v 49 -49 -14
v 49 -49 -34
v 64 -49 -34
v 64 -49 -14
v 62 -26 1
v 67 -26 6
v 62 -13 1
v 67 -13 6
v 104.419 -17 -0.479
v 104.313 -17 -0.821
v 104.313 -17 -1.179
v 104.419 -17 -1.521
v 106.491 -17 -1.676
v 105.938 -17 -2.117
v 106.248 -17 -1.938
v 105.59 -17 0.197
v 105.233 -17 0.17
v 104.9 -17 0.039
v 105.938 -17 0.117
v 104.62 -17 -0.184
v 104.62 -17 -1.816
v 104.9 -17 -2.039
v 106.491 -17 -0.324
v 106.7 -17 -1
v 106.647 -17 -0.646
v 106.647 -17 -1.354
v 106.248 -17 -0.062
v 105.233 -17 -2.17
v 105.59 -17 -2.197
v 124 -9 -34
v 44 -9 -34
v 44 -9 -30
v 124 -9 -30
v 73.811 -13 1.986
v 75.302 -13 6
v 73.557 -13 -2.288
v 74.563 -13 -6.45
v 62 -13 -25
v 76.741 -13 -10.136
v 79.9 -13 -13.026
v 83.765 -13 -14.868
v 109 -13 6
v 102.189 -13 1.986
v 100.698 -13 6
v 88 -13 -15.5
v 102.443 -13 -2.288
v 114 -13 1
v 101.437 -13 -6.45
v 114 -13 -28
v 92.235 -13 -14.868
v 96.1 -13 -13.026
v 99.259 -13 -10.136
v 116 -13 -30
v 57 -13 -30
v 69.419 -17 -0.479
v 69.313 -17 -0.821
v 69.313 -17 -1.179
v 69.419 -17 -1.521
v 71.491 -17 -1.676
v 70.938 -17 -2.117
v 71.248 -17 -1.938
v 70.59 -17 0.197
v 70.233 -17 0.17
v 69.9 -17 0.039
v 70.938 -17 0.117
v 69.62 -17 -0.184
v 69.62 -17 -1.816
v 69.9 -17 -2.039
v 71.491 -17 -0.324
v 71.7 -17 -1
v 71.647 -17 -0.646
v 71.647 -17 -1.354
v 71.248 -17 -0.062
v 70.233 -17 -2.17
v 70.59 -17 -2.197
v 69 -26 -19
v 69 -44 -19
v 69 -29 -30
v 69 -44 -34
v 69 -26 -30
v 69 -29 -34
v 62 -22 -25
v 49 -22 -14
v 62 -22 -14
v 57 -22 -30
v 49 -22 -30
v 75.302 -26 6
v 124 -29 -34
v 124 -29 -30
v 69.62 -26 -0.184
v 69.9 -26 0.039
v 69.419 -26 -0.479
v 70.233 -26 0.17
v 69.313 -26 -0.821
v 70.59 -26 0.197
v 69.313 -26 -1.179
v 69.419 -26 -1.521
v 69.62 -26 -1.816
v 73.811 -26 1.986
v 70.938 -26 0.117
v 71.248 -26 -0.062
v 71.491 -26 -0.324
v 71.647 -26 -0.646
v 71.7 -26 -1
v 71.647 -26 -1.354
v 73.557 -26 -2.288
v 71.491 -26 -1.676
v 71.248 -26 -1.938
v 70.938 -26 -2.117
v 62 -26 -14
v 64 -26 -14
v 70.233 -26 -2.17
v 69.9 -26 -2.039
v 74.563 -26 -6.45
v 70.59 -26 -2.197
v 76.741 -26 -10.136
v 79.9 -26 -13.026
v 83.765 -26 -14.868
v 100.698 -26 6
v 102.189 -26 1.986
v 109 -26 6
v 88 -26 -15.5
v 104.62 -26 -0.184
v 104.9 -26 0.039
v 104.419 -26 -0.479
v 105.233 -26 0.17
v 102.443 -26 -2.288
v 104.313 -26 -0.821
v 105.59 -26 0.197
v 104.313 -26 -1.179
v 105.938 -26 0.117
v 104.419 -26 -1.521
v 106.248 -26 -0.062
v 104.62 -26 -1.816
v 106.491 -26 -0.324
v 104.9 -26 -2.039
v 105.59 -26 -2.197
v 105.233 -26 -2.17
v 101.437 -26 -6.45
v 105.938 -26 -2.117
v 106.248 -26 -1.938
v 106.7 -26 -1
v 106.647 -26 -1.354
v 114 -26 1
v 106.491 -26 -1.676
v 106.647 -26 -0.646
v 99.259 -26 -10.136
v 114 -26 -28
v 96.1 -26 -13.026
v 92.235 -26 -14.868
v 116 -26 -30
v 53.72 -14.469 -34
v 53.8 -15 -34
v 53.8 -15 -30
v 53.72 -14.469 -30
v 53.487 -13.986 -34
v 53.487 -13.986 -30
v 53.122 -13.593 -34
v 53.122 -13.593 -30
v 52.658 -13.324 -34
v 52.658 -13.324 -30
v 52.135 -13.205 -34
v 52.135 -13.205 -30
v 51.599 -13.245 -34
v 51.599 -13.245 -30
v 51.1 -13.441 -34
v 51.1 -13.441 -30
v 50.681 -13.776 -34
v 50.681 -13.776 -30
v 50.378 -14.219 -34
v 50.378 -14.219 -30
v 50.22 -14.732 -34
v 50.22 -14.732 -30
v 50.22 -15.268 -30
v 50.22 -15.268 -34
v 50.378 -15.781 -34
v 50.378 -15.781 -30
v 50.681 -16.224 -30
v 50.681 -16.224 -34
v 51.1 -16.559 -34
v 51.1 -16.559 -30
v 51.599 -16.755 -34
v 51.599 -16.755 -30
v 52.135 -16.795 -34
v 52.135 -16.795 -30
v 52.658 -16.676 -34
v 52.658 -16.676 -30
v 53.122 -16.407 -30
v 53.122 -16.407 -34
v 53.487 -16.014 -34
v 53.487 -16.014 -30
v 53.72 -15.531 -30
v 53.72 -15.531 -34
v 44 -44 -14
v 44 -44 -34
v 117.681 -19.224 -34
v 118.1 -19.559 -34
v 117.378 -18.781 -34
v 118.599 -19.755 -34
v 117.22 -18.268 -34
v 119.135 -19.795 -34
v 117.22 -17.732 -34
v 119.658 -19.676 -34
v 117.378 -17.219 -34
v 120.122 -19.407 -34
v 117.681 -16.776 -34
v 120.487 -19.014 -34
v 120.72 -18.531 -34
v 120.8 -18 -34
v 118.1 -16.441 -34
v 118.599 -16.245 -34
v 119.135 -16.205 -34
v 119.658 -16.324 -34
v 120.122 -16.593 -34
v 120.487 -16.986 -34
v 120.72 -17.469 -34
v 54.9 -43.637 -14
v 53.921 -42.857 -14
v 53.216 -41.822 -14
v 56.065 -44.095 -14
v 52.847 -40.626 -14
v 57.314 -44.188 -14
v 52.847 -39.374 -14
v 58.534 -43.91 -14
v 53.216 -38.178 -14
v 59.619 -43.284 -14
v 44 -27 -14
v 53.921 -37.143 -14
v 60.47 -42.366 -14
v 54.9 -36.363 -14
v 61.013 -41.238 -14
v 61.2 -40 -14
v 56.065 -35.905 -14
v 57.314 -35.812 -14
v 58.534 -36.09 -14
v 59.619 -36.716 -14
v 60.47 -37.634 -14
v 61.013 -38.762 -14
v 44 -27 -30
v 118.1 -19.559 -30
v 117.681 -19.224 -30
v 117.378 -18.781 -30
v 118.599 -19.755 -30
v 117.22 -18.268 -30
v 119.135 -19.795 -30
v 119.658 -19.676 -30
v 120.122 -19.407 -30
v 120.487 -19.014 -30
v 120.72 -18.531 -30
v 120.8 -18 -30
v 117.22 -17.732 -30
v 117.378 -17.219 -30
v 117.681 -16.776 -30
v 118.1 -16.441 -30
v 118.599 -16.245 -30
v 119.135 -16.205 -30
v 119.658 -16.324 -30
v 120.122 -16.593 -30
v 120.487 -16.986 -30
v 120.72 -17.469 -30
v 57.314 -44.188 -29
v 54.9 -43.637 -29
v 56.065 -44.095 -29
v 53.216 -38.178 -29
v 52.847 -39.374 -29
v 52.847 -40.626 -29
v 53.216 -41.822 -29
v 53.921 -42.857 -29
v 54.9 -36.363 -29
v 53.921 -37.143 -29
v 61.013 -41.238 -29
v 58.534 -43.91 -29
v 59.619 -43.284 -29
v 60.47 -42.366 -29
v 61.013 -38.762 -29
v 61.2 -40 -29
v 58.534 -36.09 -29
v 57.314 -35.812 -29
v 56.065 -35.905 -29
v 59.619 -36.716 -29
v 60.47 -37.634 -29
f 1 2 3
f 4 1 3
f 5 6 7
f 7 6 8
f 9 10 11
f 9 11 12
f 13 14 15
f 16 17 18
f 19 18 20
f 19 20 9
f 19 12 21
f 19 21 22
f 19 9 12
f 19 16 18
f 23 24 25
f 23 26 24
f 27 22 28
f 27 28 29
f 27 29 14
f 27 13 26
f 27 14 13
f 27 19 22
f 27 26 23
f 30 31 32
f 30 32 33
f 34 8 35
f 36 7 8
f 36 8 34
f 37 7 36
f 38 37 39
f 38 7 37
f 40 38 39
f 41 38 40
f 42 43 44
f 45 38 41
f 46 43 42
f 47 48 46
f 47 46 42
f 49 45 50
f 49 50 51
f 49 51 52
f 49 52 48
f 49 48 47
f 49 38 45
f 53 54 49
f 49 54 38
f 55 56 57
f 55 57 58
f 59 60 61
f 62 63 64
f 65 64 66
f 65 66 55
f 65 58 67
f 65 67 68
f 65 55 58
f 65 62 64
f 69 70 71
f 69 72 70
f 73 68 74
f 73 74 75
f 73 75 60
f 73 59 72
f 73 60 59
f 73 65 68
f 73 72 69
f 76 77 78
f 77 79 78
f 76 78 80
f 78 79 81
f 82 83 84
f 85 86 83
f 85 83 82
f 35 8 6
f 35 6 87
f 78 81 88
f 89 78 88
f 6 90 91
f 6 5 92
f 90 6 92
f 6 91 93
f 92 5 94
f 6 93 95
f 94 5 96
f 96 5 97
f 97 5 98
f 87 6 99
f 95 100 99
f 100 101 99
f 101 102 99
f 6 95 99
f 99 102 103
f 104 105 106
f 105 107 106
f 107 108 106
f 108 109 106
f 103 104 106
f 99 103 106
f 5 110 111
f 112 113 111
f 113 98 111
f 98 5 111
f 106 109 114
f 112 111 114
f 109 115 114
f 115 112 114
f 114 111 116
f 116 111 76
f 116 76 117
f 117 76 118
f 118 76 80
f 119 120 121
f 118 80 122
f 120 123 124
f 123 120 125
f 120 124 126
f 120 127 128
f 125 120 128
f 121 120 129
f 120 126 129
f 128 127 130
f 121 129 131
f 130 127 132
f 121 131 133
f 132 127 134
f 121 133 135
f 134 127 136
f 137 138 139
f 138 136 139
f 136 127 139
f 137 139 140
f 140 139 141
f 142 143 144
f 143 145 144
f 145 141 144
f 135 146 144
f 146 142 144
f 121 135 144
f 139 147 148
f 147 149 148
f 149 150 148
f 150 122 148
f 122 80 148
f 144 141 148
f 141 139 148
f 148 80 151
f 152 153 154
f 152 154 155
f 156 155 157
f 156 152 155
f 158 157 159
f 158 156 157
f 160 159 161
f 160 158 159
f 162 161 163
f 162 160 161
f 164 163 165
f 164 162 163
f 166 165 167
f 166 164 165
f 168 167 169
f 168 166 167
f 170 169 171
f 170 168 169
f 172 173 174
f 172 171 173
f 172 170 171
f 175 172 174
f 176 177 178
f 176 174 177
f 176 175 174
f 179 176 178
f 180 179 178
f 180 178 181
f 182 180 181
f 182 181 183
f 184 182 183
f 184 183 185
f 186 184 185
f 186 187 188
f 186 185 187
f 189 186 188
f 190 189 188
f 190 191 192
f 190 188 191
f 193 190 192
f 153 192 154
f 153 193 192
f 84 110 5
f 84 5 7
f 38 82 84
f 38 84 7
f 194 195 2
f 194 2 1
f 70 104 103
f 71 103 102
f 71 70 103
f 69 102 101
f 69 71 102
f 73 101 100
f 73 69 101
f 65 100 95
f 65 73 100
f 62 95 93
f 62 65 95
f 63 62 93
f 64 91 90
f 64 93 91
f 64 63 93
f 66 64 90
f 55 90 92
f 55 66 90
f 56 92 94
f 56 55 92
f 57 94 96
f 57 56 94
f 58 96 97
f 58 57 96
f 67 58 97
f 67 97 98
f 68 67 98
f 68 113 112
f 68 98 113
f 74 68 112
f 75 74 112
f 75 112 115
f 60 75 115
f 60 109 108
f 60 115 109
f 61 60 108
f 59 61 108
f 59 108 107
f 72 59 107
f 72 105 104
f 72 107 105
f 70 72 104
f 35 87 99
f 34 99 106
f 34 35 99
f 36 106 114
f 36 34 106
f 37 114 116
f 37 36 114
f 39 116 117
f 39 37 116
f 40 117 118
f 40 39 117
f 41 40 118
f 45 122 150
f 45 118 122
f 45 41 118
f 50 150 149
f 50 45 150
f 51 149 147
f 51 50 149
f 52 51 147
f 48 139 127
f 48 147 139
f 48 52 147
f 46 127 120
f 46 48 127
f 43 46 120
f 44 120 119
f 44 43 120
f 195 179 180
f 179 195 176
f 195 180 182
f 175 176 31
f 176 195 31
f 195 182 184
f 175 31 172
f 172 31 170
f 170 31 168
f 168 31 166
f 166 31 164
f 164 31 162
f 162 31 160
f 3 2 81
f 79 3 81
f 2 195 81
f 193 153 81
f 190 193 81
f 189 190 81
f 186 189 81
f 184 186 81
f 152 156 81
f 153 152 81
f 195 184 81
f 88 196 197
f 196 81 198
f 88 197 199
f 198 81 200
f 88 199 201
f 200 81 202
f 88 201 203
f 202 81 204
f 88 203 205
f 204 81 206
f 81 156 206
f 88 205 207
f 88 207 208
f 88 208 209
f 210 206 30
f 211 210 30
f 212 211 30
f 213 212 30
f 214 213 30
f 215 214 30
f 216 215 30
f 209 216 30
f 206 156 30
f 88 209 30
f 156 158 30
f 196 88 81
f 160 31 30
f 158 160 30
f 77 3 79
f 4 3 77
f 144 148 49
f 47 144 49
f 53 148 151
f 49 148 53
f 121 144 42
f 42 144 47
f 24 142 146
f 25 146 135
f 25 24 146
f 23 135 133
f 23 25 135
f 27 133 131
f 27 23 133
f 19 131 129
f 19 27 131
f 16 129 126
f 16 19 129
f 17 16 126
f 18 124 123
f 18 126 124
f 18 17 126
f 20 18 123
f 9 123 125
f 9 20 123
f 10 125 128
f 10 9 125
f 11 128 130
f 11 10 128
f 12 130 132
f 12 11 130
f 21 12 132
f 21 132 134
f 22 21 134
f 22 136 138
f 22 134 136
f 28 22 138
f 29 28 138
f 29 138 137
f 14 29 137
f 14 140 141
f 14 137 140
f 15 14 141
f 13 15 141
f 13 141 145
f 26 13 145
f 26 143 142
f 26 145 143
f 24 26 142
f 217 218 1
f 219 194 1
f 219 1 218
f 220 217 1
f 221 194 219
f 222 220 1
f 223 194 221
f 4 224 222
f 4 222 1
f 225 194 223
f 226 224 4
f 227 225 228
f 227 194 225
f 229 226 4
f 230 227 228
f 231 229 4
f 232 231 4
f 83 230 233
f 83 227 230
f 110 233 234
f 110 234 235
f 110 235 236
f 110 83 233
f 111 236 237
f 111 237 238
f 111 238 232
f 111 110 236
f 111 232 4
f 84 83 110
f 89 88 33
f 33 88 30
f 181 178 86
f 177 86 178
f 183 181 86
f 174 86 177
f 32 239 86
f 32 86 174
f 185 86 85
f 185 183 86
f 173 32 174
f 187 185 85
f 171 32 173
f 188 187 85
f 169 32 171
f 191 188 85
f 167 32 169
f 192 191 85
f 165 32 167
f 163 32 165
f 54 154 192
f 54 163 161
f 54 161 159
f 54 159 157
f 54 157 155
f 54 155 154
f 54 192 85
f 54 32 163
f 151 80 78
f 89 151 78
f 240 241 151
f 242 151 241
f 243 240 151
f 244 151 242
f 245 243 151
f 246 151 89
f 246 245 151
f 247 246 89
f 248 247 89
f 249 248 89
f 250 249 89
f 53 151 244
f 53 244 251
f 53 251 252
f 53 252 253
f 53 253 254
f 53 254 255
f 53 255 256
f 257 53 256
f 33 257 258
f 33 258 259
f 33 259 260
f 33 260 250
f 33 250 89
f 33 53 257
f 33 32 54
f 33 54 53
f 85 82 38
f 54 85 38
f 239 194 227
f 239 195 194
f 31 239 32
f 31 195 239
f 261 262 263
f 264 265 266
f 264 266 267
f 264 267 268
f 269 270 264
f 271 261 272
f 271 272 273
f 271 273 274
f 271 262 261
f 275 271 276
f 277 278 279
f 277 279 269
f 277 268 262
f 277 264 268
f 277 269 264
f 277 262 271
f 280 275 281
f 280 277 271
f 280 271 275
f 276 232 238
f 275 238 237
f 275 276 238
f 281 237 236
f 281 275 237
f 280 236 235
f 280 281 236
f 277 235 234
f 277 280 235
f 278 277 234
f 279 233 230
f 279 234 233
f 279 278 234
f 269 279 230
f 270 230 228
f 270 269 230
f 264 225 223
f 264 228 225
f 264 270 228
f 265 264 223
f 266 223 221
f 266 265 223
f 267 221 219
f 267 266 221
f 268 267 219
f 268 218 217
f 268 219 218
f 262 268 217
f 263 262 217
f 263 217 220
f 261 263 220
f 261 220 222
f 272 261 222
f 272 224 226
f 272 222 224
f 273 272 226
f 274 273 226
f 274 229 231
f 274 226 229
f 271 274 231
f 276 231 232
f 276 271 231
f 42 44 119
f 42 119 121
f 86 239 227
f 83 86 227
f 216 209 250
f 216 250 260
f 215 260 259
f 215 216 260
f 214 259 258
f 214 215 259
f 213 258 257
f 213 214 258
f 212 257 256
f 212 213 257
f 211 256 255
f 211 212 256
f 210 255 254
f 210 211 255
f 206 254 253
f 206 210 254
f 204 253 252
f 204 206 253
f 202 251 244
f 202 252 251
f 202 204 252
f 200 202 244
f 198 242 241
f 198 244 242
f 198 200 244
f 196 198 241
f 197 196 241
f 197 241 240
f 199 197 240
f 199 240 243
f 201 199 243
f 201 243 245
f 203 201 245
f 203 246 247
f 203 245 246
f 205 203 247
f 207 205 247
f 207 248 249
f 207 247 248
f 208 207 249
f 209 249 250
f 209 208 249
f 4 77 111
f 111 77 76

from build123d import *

# Parameters (mm, degrees)
CYLINDER050_R          = 14.5
CYLINDER050_DEPTH      = 22
CYLINDER050_ROLL_ANGLE = 90
CYLINDER047_R          = 1.8
CYLINDER047_DEPTH      = 10
CYLINDER048_R          = 1.2
CYLINDER048_DEPTH      = 10
CYLINDER048_ROLL_ANGLE = 90
CYLINDER049_R          = 1.2
CYLINDER049_DEPTH      = 10
CYLINDER049_ROLL_ANGLE = 90
CYLINDER046_R          = 1.8
CYLINDER046_DEPTH      = 10
BOX006_W               = 52
BOX006_H               = 13
BOX006_DEPTH           = 40
BOX012_W               = 80
BOX012_H               = 20
BOX012_DEPTH           = 4
CYLINDER035_R          = 4.2
CYLINDER035_DEPTH      = 200
BOX007_W               = 25
BOX007_H               = 27
BOX007_DEPTH           = 20
CHAMFER007_SIZE        = 5
CHAMFER008_SIZE        = 5
CHAMFER009_SIZE        = 2
CHAMFER010_SIZE        = 5
CHAMFER011_SIZE        = 5
CHAMFER012_SIZE        = 5
CHAMFER013_SIZE        = 5
CHAMFER014_SIZE        = 5


with BuildPart() as cilindro047:
    # Cylinder050 → Cylinder050 (new body)
    with BuildSketch(Plane.XY):
        Circle(CYLINDER050_R)
    extrude(amount=CYLINDER050_DEPTH)


with BuildPart() as cilindro047_1:
    # Cylinder050 roll: moved
    add(cilindro047.part.rotate(Axis((0, 0, 0), (1, 0, 0)), CYLINDER050_ROLL_ANGLE))


with BuildPart() as cilindro047_2:
    # Cylinder050 placement: moved
    add(cilindro047_1.part.moved(Location((88, -7, -1))))


with BuildPart() as cilindro044:
    # Cylinder047 → Cylinder047 (new body)
    with BuildSketch(Plane(origin=(52, -15, -35), x_dir=(1, 0, 0), z_dir=(0, 0, 1))):
        Circle(CYLINDER047_R)
    extrude(amount=CYLINDER047_DEPTH)


with BuildPart() as cilindro045:
    # Cylinder048 → Cylinder048 (new body)
    with BuildSketch(Plane.XY):
        Circle(CYLINDER048_R)
    extrude(amount=CYLINDER048_DEPTH)


with BuildPart() as cilindro045_1:
    # Cylinder048 roll: moved
    add(cilindro045.part.rotate(Axis((0, 0, 0), (1, 0, 0)), CYLINDER048_ROLL_ANGLE))


with BuildPart() as cilindro045_2:
    # Cylinder048 placement: moved
    add(cilindro045_1.part.moved(Location((70.5, -17, -1))))


with BuildPart() as cilindro046:
    # Cylinder049 → Cylinder049 (new body)
    with BuildSketch(Plane.XY):
        Circle(CYLINDER049_R)
    extrude(amount=CYLINDER049_DEPTH)


with BuildPart() as cilindro046_1:
    # Cylinder049 roll: moved
    add(cilindro046.part.rotate(Axis((0, 0, 0), (1, 0, 0)), CYLINDER049_ROLL_ANGLE))


with BuildPart() as cilindro046_2:
    # Cylinder049 placement: moved
    add(cilindro046_1.part.moved(Location((105.5, -17, -1))))


with BuildPart() as fusion010:
    # Cylinder046 → Cylinder046 (new body)
    with BuildSketch(Plane(origin=(119, -18, -35), x_dir=(1, 0, 0), z_dir=(0, 0, 1))):
        Circle(CYLINDER046_R)
    extrude(amount=CYLINDER046_DEPTH)

    # Fusion010: union Cilindro044, Cilindro045, Cilindro046
    add(cilindro044.part)
    add(cilindro045_2.part)
    add(cilindro046_2.part)


with BuildPart() as cubo006:
    # Box006 → Box006 (new body)
    with BuildSketch(Plane(origin=(62, -26, -34), x_dir=(1, 0, 0), z_dir=(0, 0, 1))):
        with Locations((26, 6.5)):
            Rectangle(BOX006_W, BOX006_H)
    extrude(amount=BOX006_DEPTH)


with BuildPart() as cubo012:
    # Box012 → Box012 (new body)
    with BuildSketch(Plane(origin=(44, -29, -34), x_dir=(1, 0, 0), z_dir=(0, 0, 1))):
        with Locations((40, 10)):
            Rectangle(BOX012_W, BOX012_H)
    extrude(amount=BOX012_DEPTH)


with BuildPart() as cilindro032:
    # Cylinder035 → Cylinder035 (new body)
    with BuildSketch(Plane(origin=(57, -40, -29), x_dir=(1, 0, 0), z_dir=(0, 0, 1))):
        Circle(CYLINDER035_R)
    extrude(amount=CYLINDER035_DEPTH)


with BuildPart() as base_motor:
    # Box007 → Box007 (new body)
    with BuildSketch(Plane(origin=(44, -49, -34), x_dir=(1, 0, 0), z_dir=(0, 0, 1))):
        with Locations((12.5, 13.5)):
            Rectangle(BOX007_W, BOX007_H)
    extrude(amount=BOX007_DEPTH)

    # Cut028: cut Cilindro032
    add(cilindro032.part, mode=Mode.SUBTRACT)

    # Fusion011: union Cubo006, Cubo012
    add(cubo006.part)
    add(cubo012.part)

    # Cut035: cut Fusion010
    add(fusion010.part, mode=Mode.SUBTRACT)

    # Cut036: cut Cilindro047
    add(cilindro047_2.part, mode=Mode.SUBTRACT)

    # Chamfer007
    chamfer007_edges = [base_motor.edges().sort_by_distance(p)[0] for p in [
        (69, -37.5, -14),
    ]]
    chamfer(chamfer007_edges, length=CHAMFER007_SIZE)

    # Chamfer008
    chamfer008_edges = [base_motor.edges().sort_by_distance(p)[0] for p in [
        (62, -17.5, -30),
    ]]
    chamfer(chamfer008_edges, length=CHAMFER008_SIZE)

    # Chamfer009
    chamfer009_edges = [base_motor.edges().sort_by_distance(p)[0] for p in [
        (114, -19.5, -30),
    ]]
    chamfer(chamfer009_edges, length=CHAMFER009_SIZE)

    # Chamfer010
    chamfer010_edges = [base_motor.edges().sort_by_distance(p)[0] for p in [
        (44, -22, -22),
    ]]
    chamfer(chamfer010_edges, length=CHAMFER010_SIZE)

    # Chamfer011
    chamfer011_edges = [base_motor.edges().sort_by_distance(p)[0] for p in [
        (44, -49, -24),
    ]]
    chamfer(chamfer011_edges, length=CHAMFER011_SIZE)

    # Chamfer012
    chamfer012_edges = [base_motor.edges().sort_by_distance(p)[0] for p in [
        (62, -19.5, 6),
    ]]
    chamfer(chamfer012_edges, length=CHAMFER012_SIZE)

    # Chamfer013
    chamfer013_edges = [base_motor.edges().sort_by_distance(p)[0] for p in [
        (114, -19.5, 6),
    ]]
    chamfer(chamfer013_edges, length=CHAMFER013_SIZE)

    # Chamfer014
    chamfer014_edges = [base_motor.edges().sort_by_distance(p)[0] for p in [
        (69, -49, -26.5),
    ]]
    chamfer(chamfer014_edges, length=CHAMFER014_SIZE)


solid = base_motor.part
